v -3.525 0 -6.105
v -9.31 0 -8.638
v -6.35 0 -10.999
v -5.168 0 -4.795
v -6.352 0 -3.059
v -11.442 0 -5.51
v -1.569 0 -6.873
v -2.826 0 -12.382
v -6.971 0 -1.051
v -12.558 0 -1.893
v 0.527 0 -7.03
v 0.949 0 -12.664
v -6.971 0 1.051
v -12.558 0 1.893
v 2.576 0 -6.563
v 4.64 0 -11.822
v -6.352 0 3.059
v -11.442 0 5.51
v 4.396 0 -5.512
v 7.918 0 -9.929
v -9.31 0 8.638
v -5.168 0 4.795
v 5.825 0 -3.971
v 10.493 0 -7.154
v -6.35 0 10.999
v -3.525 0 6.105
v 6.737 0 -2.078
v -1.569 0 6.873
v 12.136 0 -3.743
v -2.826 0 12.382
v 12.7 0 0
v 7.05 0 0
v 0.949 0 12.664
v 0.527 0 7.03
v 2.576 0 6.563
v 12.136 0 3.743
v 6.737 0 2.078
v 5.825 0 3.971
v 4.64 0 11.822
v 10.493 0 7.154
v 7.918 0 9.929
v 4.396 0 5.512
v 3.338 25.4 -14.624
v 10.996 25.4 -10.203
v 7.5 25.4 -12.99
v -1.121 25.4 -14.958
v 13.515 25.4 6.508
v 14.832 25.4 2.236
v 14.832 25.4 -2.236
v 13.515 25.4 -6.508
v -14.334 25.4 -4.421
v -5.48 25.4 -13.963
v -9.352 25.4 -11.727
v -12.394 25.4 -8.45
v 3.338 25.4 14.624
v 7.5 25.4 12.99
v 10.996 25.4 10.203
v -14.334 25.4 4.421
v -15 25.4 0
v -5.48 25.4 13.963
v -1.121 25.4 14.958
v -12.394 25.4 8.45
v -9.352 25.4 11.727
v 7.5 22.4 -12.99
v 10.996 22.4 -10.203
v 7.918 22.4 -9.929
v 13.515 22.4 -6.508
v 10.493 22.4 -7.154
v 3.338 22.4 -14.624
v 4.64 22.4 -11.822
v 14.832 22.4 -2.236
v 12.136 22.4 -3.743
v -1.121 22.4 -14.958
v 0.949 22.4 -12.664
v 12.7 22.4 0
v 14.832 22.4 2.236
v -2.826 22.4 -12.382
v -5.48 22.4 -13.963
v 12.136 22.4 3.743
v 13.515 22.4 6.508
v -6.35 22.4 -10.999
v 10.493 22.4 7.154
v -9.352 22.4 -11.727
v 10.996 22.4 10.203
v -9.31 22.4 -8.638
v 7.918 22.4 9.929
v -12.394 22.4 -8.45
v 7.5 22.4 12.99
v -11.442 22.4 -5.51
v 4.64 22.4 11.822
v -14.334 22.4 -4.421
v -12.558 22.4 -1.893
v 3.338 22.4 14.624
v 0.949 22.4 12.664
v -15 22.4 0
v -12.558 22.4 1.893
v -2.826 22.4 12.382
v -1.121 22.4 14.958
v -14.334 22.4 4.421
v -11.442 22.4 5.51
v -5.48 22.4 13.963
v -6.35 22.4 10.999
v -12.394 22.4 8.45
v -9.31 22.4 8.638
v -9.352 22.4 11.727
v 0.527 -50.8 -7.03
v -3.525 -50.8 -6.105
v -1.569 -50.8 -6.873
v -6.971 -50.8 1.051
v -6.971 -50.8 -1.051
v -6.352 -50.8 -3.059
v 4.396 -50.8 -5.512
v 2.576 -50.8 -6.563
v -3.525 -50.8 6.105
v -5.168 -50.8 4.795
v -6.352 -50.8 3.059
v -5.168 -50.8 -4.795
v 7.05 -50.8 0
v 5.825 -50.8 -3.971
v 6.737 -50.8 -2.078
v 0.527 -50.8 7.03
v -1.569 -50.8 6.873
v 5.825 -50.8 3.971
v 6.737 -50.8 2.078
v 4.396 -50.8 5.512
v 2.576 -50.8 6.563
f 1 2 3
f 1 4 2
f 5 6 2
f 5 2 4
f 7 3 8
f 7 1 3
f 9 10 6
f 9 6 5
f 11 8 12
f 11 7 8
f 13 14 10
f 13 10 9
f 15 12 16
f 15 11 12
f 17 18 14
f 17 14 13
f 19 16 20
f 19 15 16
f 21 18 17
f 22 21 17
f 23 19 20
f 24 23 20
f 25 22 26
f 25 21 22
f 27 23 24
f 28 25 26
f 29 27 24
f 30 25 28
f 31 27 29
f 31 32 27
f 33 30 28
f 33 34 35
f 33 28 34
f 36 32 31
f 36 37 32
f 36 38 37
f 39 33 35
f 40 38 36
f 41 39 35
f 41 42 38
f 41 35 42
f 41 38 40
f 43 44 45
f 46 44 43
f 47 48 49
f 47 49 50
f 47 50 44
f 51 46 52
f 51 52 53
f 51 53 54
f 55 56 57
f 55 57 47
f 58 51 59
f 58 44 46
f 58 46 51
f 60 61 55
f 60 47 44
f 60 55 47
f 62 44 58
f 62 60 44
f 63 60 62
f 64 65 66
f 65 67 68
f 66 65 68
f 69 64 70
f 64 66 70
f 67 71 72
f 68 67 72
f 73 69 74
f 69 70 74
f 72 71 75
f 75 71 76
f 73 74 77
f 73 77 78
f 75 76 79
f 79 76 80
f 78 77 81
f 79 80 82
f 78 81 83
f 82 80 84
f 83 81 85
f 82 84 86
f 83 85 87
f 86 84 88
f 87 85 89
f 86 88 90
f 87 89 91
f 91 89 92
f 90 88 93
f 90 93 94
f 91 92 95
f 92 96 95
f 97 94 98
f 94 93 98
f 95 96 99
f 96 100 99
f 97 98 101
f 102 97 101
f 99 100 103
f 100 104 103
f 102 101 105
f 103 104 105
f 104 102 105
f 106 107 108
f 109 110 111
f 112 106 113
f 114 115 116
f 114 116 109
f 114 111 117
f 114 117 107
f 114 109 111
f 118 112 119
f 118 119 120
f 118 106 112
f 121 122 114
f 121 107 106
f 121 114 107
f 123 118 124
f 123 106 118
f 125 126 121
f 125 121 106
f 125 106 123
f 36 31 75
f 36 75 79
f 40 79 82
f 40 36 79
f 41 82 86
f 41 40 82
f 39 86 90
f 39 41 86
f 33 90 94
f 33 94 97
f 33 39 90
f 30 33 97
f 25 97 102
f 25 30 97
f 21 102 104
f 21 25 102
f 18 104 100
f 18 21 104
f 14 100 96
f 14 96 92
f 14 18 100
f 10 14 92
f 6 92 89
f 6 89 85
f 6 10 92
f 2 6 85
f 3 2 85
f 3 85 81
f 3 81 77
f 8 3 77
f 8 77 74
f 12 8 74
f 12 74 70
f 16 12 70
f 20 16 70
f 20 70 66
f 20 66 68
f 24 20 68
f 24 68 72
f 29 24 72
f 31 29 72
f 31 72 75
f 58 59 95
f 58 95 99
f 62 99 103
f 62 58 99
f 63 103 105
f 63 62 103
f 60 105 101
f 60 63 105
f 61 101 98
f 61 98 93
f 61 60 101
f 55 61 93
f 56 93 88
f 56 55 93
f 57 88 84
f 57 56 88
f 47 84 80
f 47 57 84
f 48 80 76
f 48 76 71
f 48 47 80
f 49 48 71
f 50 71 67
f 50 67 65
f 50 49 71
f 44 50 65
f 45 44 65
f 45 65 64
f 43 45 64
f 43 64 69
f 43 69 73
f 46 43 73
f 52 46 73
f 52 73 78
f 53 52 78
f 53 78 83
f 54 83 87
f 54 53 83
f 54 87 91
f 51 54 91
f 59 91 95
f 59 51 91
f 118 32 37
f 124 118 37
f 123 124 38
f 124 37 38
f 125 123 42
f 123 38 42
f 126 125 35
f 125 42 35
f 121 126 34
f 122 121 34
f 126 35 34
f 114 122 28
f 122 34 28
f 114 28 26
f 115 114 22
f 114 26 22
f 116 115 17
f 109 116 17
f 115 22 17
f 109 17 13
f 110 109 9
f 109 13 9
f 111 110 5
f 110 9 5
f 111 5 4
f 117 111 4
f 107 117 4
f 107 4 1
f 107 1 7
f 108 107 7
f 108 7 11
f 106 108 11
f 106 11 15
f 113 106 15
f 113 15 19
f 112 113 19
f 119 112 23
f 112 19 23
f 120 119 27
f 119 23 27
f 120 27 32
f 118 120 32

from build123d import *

# Parameters (mm, degrees)
F0_R     = 7.05
F1_DEPTH = 50.8
F2_R     = 12.7
F3_DEPTH = 25.4
F4_R     = 15
F5_DEPTH = 3


with BuildPart() as f1:
    # F0 (on Front) → F1 (new body)
    with BuildSketch(Plane.XZ):
        Circle(F0_R)
    extrude(amount=F1_DEPTH)

    # F2 (on Front) → F3 (join)
    with BuildSketch(Plane.XZ):
        Circle(F2_R)
    extrude(amount=-F3_DEPTH)

    # F4 (on face) → F5 (join)
    with BuildSketch(Plane(origin=(0, 25.4, 0), x_dir=(-1, 0, 0), z_dir=(0, 1, 0))):
        Circle(F4_R)
    extrude(amount=-F5_DEPTH)


solid = f1.part
